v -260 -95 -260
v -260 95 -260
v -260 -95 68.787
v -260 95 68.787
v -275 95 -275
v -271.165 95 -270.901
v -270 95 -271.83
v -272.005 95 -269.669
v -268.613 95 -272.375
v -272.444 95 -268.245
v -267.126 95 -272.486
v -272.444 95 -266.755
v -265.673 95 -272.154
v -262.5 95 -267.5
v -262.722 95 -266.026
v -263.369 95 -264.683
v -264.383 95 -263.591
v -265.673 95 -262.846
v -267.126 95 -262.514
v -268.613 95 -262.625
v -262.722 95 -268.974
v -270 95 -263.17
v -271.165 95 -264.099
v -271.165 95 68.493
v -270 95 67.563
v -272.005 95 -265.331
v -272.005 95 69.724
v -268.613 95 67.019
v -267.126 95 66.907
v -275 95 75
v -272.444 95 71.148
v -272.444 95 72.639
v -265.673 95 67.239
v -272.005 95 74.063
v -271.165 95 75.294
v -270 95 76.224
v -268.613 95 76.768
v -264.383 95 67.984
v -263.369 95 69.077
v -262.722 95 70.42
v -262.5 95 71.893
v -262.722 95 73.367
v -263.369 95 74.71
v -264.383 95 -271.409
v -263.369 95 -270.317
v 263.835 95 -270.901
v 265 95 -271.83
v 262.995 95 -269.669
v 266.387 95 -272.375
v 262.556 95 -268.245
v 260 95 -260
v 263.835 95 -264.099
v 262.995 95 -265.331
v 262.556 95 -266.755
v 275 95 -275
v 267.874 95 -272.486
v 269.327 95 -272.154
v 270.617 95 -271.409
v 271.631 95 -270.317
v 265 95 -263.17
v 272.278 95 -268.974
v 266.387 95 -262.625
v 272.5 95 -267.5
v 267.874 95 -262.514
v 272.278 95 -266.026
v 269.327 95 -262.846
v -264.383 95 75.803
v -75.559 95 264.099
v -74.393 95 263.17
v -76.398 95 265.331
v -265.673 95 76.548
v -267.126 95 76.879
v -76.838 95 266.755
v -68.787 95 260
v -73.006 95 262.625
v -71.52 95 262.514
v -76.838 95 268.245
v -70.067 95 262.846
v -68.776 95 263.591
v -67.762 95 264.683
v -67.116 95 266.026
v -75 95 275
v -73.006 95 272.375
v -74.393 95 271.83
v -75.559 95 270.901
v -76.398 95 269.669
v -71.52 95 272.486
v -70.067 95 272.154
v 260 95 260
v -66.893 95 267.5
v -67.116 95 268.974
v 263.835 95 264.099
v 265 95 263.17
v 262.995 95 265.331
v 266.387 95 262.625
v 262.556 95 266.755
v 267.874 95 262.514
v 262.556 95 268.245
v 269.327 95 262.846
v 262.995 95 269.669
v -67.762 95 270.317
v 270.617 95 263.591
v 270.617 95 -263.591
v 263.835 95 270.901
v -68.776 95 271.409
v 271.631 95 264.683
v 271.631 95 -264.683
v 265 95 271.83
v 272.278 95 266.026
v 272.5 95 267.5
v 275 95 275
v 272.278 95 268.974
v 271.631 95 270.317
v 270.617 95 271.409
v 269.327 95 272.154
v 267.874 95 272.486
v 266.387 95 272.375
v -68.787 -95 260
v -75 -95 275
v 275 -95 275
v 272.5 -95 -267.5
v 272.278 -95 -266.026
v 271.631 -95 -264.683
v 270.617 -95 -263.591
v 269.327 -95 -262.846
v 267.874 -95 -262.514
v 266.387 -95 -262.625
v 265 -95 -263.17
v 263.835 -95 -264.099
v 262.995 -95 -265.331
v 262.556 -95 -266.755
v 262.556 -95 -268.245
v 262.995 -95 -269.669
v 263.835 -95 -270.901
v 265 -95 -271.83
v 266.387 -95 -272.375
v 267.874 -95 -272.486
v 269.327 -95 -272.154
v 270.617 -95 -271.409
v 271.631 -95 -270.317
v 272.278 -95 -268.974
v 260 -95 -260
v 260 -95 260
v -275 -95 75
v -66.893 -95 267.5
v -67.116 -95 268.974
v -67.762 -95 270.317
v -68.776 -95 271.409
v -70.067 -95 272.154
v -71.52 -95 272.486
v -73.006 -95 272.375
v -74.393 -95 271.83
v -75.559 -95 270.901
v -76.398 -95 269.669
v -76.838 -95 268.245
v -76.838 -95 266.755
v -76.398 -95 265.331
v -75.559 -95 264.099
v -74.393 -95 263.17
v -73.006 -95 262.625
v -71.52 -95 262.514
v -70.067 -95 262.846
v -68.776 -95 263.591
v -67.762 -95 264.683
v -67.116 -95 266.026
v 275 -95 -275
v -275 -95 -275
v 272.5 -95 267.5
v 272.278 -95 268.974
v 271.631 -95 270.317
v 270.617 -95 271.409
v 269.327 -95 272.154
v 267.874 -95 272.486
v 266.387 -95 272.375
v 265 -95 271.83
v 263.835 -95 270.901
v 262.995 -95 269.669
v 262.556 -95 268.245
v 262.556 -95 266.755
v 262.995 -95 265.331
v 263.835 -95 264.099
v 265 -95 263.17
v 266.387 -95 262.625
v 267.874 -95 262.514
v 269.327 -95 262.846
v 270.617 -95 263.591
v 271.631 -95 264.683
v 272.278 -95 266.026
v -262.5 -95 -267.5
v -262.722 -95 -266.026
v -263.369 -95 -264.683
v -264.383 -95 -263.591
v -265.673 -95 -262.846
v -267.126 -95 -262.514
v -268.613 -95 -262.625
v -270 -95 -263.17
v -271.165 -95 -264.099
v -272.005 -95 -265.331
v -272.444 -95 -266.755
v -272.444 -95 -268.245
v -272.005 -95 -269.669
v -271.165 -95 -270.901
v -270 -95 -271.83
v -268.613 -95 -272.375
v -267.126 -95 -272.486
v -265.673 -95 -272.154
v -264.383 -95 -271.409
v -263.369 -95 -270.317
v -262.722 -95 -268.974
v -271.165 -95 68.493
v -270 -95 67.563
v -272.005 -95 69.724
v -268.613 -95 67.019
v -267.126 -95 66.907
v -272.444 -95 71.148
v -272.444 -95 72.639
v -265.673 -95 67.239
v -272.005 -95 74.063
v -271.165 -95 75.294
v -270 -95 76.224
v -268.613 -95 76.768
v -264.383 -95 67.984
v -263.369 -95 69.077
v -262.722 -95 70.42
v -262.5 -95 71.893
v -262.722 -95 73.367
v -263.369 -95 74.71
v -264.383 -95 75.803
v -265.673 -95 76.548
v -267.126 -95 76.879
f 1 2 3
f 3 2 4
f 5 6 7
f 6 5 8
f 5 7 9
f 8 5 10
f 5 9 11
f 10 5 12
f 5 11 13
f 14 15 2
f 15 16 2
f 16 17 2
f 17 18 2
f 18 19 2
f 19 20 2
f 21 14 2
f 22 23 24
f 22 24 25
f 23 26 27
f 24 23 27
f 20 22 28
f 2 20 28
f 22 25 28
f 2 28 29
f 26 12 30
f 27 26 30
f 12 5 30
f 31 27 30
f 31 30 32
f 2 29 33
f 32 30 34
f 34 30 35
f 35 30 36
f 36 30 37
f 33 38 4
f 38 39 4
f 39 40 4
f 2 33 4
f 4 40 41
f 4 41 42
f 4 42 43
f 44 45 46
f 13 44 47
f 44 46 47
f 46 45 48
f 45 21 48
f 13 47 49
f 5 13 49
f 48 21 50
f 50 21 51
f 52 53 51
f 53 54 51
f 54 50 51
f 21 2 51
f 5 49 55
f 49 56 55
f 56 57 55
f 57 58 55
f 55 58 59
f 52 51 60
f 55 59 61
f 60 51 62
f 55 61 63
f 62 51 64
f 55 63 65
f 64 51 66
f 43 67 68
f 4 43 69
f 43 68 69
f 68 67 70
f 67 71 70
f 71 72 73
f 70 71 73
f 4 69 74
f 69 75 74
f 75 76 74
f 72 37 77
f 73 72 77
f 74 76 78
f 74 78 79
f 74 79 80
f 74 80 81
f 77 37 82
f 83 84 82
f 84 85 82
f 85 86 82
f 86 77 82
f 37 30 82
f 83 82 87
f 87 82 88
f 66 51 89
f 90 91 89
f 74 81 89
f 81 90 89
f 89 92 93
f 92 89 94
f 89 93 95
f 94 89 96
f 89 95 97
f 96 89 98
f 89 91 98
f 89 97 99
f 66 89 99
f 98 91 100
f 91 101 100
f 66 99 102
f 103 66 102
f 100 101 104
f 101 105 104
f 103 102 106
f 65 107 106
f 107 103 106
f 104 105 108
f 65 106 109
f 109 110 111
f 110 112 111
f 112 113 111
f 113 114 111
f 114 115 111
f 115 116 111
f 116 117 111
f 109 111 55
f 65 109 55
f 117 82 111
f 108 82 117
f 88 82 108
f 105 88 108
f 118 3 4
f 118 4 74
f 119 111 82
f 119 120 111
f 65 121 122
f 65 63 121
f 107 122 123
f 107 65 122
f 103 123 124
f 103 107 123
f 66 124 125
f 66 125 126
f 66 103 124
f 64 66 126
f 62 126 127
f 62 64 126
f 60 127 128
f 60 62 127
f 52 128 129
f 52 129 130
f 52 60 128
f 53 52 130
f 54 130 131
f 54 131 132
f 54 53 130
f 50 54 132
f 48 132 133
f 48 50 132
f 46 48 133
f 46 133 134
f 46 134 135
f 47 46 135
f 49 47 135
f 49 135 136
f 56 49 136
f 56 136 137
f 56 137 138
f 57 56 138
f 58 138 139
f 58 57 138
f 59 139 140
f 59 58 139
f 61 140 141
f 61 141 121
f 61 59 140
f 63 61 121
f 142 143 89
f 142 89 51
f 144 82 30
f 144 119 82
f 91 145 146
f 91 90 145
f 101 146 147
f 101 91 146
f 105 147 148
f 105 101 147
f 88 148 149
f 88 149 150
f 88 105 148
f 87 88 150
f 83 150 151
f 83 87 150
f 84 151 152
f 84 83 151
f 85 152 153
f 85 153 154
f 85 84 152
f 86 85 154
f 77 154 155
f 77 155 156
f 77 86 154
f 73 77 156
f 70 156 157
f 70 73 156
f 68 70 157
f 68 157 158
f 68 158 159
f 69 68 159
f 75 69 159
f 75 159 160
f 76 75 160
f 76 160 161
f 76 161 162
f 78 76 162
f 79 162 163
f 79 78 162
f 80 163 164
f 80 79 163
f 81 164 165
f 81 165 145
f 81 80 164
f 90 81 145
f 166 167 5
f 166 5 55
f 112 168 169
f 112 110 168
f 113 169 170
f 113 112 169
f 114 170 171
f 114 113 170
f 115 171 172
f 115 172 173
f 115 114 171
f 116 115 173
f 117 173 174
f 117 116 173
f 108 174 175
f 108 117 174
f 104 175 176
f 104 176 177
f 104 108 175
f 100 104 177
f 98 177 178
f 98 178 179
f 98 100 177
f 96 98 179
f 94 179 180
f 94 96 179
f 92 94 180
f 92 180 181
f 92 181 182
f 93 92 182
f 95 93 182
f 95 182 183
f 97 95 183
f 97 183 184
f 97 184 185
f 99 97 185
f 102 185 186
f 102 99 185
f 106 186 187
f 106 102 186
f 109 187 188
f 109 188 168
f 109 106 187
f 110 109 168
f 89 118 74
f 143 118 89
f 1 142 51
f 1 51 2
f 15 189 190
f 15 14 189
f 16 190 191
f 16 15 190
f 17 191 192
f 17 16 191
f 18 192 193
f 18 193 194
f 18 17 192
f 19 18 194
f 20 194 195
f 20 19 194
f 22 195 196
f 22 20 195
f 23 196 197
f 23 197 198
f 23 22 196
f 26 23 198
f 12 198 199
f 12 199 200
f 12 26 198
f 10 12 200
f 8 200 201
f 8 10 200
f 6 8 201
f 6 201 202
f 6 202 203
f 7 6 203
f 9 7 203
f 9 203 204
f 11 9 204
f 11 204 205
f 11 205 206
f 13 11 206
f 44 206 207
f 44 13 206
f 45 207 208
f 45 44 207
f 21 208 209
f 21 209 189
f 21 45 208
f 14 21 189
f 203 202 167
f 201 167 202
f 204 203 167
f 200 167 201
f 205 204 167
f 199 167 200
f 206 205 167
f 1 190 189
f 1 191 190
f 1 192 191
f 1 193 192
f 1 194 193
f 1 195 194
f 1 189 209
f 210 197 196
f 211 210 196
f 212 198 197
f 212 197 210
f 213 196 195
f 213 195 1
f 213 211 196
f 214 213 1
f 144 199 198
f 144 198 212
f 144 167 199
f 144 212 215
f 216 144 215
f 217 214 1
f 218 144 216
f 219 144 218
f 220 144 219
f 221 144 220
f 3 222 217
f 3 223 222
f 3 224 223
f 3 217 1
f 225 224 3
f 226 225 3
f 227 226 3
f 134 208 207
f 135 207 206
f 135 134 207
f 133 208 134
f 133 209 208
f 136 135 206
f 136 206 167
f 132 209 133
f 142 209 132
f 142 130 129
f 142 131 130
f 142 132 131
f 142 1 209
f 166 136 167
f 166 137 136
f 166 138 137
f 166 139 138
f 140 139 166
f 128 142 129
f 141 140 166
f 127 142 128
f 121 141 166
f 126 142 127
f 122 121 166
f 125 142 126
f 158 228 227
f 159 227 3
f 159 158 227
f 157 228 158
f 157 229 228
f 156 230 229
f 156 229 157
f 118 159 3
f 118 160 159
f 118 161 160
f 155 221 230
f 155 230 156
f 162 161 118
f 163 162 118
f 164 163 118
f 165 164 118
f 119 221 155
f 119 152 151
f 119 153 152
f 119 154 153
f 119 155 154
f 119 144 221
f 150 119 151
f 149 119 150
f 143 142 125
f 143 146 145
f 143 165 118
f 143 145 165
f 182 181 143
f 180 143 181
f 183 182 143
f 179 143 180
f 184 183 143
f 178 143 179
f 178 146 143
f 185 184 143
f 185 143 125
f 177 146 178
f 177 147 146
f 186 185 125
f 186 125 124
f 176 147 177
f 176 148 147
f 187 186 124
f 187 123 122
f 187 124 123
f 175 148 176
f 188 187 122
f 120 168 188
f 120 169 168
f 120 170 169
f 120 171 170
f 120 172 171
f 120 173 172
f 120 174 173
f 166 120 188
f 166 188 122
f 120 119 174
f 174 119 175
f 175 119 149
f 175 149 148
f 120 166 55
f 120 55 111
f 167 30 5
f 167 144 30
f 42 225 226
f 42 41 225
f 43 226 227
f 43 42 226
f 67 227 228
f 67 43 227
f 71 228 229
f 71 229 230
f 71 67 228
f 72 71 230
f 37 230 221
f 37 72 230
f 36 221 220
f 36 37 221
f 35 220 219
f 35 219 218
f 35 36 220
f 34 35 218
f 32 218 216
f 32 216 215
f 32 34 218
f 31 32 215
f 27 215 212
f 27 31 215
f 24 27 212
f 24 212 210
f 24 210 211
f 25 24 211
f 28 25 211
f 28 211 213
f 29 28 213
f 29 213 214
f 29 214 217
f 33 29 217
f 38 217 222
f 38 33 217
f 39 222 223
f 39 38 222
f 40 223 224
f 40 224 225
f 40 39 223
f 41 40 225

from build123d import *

# Parameters (mm, degrees)
F0_R     = 5
F1_DEPTH = 95


with BuildPart() as f1:
    # F0 (on Front) → F1 (new body, symmetric)
    with BuildSketch(Plane.XZ):
        Polygon((-275, 75), (-275, -275), (275, -275), (275, 275), (-75, 275), align=None)
        with Locations((-267.5, -267.5)):
            Circle(F0_R, mode=Mode.SUBTRACT)
        with Locations((267.5, -267.5)):
            Circle(F0_R, mode=Mode.SUBTRACT)
        with Locations((-267.5, 71.8933982822)):
            Circle(F0_R, mode=Mode.SUBTRACT)
        with Locations((-71.8933982822, 267.5)):
            Circle(F0_R, mode=Mode.SUBTRACT)
        Polygon((260, -260), (-260, -260), (-260, 68.7867965644), (-68.7867965644, 260), (-35, 260), (260, 260), (260, 130), (260, -35), align=None, mode=Mode.SUBTRACT)
        with Locations((267.5, 267.5)):
            Circle(F0_R, mode=Mode.SUBTRACT)
    extrude(amount=F1_DEPTH, both=True)


solid = f1.part
